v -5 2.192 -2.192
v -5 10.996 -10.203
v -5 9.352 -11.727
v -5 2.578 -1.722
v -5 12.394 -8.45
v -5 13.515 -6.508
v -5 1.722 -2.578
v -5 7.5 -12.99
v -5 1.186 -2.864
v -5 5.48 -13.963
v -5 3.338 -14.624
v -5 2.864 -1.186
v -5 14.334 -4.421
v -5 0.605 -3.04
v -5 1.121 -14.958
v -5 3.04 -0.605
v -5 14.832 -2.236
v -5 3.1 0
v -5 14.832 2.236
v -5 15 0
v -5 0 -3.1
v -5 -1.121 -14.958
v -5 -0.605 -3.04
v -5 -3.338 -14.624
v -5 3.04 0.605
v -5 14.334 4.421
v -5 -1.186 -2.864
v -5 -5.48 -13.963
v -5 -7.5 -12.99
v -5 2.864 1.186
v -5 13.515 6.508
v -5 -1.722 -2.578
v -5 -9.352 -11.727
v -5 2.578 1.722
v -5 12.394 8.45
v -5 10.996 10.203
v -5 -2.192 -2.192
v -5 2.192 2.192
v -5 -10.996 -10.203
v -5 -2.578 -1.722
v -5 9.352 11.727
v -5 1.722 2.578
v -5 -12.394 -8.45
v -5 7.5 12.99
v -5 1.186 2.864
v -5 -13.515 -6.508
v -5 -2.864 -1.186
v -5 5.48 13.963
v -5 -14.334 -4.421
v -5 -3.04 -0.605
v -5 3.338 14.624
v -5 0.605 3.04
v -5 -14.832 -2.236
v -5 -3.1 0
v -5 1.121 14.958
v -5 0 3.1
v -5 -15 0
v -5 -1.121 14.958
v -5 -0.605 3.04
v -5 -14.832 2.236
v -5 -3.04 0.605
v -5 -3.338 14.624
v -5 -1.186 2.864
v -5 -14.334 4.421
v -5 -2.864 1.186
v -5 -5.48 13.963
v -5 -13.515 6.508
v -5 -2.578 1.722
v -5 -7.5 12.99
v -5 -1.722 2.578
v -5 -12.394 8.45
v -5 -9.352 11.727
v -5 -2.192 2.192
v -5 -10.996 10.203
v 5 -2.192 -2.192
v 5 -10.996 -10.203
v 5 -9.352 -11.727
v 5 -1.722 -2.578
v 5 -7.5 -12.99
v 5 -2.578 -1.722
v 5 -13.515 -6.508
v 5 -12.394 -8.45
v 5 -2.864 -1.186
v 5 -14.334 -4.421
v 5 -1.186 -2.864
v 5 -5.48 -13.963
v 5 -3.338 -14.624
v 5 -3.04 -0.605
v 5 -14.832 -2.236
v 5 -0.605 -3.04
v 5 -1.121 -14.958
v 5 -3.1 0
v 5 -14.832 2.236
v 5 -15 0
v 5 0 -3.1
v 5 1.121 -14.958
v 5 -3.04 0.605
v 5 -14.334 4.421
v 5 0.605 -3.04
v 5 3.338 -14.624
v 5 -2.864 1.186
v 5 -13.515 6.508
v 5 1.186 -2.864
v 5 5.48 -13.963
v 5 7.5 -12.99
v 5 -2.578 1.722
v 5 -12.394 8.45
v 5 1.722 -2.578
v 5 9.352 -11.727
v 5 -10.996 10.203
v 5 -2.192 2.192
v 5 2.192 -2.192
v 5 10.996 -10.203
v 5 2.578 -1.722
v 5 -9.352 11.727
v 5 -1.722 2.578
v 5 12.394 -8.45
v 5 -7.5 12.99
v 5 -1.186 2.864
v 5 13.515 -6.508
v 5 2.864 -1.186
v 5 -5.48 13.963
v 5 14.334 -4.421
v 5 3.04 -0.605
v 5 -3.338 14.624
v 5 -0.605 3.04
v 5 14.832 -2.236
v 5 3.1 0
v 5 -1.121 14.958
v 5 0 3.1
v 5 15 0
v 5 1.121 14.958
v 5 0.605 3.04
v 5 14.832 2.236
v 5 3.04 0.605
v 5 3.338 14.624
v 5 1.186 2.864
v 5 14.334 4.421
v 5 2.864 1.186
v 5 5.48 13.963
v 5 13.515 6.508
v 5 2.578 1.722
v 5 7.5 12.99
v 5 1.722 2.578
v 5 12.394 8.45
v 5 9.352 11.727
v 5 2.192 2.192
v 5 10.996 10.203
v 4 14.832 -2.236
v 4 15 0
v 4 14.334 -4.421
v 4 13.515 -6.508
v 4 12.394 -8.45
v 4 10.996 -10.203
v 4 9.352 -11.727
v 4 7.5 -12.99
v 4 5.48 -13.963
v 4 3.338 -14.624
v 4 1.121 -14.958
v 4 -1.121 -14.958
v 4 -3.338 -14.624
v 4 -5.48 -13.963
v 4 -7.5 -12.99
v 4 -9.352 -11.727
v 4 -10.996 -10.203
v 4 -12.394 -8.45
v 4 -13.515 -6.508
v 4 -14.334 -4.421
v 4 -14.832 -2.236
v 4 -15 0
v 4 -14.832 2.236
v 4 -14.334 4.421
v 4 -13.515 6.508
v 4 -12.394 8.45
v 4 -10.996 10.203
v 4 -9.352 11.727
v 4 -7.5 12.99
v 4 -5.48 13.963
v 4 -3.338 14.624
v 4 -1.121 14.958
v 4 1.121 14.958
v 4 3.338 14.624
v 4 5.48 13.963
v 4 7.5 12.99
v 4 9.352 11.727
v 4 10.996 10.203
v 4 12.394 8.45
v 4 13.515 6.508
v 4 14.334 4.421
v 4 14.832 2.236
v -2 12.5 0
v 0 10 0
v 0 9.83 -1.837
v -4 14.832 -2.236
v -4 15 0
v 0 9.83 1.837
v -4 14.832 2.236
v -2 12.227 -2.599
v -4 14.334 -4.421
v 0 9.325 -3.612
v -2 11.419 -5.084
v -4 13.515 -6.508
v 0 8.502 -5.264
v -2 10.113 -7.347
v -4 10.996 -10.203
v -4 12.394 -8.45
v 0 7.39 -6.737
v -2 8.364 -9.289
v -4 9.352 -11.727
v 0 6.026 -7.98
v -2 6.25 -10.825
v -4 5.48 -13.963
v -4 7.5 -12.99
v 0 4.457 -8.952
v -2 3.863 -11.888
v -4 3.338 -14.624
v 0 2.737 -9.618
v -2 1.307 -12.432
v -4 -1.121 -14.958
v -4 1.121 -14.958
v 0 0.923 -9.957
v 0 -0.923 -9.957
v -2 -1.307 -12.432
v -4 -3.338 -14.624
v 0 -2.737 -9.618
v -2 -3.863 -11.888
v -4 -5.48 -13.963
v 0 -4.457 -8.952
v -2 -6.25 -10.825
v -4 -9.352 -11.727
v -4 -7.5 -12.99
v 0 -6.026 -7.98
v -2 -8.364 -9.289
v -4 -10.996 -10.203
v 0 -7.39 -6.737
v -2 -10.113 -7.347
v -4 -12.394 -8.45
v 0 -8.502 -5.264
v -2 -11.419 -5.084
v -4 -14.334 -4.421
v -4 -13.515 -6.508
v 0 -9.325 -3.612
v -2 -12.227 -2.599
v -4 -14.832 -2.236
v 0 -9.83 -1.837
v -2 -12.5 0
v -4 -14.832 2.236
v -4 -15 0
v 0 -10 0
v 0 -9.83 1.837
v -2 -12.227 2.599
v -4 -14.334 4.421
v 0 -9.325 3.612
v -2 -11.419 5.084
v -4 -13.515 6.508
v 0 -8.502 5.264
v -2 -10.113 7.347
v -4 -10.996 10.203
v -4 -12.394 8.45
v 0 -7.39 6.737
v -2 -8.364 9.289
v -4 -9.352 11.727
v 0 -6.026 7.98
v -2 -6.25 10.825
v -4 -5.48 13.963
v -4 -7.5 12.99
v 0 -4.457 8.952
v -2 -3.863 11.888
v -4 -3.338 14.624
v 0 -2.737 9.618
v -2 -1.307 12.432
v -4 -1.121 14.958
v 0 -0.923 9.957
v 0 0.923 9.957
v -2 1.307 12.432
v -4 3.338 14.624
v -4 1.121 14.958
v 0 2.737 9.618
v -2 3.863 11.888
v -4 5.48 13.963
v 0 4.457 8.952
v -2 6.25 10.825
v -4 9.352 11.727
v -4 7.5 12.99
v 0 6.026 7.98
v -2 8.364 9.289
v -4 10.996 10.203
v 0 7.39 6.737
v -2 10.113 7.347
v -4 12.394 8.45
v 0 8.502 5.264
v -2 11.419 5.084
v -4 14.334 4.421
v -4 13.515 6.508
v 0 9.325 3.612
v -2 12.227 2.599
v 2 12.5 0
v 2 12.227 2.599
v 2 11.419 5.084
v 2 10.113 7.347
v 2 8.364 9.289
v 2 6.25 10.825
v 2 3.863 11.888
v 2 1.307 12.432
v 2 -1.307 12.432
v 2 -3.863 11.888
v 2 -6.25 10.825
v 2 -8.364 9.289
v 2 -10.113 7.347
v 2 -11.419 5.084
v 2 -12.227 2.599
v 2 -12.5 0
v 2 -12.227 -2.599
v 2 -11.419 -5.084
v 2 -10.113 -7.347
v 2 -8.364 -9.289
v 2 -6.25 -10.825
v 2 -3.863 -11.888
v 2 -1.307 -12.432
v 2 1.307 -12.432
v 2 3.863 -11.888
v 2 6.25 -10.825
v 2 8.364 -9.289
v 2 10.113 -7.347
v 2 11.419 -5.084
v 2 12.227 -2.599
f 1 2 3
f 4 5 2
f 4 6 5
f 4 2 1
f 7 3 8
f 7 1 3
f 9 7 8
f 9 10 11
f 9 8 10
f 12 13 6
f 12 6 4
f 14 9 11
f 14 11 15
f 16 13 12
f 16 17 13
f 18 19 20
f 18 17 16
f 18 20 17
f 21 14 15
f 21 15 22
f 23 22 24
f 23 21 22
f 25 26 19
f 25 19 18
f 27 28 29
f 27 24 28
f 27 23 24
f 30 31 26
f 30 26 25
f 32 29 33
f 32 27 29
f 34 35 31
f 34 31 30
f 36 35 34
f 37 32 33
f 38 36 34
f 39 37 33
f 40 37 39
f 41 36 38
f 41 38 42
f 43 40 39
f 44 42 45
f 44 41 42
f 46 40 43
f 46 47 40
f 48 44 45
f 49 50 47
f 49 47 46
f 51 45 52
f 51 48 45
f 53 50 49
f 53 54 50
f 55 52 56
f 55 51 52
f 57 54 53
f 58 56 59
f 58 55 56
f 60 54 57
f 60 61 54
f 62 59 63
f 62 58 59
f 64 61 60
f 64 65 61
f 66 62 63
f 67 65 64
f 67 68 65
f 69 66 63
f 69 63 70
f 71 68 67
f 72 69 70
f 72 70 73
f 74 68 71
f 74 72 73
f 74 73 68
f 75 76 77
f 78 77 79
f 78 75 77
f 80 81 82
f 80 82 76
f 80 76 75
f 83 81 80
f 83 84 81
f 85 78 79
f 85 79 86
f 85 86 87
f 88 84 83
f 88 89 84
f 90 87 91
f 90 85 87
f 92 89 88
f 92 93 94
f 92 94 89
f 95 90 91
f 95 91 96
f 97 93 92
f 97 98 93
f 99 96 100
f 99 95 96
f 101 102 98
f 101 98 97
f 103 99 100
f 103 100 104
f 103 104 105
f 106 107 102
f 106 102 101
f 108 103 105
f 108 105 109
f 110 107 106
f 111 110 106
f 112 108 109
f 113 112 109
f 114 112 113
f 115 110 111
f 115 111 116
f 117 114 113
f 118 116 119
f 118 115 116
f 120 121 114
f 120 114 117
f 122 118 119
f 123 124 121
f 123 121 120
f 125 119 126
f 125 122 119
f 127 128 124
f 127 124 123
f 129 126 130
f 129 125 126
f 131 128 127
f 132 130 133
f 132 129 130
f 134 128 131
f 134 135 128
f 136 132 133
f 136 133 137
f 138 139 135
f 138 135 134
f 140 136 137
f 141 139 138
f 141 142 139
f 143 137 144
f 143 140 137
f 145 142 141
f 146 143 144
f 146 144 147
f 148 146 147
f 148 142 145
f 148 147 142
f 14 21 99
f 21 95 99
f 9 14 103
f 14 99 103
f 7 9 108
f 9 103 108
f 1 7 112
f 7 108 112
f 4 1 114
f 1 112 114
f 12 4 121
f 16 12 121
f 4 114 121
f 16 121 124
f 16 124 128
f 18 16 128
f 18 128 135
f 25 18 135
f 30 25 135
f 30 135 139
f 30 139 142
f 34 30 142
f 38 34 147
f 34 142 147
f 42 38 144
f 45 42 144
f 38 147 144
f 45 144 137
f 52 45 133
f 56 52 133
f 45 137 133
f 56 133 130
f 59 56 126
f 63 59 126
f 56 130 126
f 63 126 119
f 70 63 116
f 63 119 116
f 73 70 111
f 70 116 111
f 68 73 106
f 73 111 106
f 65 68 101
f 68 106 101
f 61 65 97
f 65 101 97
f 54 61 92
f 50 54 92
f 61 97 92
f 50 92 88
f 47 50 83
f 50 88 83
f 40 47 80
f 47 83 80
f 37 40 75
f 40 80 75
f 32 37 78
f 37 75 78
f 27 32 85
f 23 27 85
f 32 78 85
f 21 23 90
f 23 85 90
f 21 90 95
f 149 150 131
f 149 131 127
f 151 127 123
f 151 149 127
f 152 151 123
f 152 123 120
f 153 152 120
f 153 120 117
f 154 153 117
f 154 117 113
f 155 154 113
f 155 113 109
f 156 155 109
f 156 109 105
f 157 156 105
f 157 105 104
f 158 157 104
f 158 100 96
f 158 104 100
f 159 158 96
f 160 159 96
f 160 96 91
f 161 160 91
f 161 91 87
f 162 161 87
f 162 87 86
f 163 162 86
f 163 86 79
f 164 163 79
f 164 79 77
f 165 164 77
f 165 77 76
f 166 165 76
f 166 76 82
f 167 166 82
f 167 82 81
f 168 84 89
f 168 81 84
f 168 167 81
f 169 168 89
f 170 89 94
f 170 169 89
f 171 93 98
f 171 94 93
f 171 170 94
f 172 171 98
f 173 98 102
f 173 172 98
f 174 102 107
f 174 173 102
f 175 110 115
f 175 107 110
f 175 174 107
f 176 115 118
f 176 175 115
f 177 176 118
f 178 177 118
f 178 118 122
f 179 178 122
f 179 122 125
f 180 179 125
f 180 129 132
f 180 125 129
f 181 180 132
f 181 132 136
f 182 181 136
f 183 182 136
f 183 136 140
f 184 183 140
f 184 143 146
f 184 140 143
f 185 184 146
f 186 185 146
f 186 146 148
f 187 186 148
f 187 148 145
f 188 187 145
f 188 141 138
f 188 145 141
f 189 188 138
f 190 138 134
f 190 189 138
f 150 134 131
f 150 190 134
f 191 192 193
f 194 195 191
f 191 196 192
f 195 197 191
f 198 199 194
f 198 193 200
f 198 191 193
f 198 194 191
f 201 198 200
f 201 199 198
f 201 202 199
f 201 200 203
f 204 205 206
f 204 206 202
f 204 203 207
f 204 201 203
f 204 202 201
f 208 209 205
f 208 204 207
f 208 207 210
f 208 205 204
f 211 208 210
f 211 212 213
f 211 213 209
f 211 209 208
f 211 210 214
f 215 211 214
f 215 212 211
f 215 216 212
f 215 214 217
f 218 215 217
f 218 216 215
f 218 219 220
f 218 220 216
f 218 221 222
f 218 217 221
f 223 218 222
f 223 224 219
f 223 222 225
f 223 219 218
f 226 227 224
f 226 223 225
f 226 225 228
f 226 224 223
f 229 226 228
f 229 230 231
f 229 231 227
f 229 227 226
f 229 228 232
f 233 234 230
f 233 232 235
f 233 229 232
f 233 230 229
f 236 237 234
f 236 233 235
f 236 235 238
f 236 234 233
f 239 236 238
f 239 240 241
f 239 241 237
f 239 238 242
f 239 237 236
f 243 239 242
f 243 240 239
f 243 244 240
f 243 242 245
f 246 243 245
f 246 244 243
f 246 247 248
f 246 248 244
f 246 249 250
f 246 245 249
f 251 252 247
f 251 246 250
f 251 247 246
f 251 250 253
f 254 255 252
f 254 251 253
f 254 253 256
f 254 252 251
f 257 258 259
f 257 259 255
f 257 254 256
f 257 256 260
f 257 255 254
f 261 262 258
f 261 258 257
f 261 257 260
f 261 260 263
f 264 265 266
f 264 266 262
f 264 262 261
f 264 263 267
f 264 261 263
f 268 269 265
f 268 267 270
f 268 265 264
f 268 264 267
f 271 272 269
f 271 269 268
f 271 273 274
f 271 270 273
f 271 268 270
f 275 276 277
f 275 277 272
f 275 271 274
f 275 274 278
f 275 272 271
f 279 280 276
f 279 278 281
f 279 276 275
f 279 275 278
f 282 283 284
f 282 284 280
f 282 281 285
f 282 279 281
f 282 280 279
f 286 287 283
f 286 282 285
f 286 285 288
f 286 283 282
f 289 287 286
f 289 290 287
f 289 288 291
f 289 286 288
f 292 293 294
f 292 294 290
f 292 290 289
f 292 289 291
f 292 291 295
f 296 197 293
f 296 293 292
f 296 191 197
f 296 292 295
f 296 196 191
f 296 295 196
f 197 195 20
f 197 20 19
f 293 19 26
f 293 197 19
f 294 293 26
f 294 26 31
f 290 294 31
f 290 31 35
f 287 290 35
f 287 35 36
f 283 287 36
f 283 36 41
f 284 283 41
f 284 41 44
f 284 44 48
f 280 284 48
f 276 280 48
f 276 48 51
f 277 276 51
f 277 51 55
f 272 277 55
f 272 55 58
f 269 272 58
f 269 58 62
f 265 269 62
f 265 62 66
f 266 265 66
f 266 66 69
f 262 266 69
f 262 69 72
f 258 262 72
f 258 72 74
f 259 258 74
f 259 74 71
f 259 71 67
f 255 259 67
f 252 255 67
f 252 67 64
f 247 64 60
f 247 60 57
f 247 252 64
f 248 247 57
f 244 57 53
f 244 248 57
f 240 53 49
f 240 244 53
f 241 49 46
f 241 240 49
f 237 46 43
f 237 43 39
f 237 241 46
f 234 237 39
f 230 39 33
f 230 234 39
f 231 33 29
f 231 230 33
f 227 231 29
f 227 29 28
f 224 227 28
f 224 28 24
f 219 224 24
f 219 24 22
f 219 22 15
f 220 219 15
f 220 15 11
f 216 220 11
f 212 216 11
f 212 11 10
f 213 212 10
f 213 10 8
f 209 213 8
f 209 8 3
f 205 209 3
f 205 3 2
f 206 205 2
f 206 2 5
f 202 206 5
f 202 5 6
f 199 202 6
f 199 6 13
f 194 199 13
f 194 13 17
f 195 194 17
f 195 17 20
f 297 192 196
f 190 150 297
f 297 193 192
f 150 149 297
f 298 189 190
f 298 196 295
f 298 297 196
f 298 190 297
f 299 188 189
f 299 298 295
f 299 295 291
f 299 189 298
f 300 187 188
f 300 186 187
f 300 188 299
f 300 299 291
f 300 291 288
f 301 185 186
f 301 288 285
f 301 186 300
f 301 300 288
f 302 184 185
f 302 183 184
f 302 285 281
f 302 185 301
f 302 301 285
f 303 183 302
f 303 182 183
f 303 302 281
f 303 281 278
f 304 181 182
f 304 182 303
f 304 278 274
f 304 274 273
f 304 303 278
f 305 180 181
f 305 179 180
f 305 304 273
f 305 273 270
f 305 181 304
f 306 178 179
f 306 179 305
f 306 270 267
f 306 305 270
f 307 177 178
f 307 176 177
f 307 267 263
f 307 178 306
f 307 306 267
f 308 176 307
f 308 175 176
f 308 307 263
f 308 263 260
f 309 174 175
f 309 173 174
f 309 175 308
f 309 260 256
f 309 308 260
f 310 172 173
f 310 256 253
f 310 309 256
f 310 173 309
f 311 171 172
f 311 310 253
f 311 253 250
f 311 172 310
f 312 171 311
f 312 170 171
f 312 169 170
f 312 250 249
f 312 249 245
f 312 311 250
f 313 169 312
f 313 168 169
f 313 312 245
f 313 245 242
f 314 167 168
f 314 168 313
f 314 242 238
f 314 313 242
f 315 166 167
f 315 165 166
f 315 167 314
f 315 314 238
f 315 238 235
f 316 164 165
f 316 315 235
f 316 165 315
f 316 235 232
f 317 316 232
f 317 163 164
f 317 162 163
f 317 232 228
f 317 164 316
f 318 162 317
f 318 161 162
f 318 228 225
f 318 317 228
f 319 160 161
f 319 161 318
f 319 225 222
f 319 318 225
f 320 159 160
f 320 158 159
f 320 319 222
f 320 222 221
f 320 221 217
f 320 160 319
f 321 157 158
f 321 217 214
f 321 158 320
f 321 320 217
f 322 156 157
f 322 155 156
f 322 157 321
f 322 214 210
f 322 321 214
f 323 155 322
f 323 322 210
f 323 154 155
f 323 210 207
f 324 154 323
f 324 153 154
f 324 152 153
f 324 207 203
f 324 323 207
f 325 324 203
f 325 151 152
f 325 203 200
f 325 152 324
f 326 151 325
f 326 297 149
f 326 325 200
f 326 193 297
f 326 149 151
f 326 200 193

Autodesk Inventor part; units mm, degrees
ref_plane "YZ Plane" through (0, 0, 0) normal (1, 0, 0) x (0, 1, 0)
ref_plane "XZ Plane" through (0, 0, 0) normal (0, 1, 0) x (-1, 0, 0)
ref_plane "XY Plane" through (0, 0, 0) normal (0, 0, 1) x (1, 0, 0)
sketch "Sketch1" plane through (0, 0, 0) normal (0, 0, 1) x (1, 0, 0)
  line L0 (0, 0) -> (0, 10)
  line L1 (0, 0) -> (5, 0)
  line L2 (5, 0) -> (5, 15)
  line L3 (5, 15) -> (4, 15)
  line L4 (4, 15) -> (0, 10)
  dimension "d0" = 10
  dimension "d1" = 5
  dimension "d2" = 15
  dimension "d7" = 1
revolve "Revolution1" add sketch "Sketch1" angle 360 about axis through (0, 0, 0) along (1, 0, 0)
mirror "Mirror1" about plane through (0, 0, 0) normal (1, 0, 0)
sketch "Sketch2" plane through (5, 0, 0) normal (1, 0, 0) x (0, 0, -1)
  circle A0 centre (0, 0) radius 3.1
  dimension "d4" = 6.2
extrude "Extrusion1" cut sketch "Sketch2" against normal through all
sketch "Sketch3" plane through (5, 0, 0) normal (1, 0, 0) x (0, 0, -1)
  point P0 (0, 0)
properties part number "pulley"
